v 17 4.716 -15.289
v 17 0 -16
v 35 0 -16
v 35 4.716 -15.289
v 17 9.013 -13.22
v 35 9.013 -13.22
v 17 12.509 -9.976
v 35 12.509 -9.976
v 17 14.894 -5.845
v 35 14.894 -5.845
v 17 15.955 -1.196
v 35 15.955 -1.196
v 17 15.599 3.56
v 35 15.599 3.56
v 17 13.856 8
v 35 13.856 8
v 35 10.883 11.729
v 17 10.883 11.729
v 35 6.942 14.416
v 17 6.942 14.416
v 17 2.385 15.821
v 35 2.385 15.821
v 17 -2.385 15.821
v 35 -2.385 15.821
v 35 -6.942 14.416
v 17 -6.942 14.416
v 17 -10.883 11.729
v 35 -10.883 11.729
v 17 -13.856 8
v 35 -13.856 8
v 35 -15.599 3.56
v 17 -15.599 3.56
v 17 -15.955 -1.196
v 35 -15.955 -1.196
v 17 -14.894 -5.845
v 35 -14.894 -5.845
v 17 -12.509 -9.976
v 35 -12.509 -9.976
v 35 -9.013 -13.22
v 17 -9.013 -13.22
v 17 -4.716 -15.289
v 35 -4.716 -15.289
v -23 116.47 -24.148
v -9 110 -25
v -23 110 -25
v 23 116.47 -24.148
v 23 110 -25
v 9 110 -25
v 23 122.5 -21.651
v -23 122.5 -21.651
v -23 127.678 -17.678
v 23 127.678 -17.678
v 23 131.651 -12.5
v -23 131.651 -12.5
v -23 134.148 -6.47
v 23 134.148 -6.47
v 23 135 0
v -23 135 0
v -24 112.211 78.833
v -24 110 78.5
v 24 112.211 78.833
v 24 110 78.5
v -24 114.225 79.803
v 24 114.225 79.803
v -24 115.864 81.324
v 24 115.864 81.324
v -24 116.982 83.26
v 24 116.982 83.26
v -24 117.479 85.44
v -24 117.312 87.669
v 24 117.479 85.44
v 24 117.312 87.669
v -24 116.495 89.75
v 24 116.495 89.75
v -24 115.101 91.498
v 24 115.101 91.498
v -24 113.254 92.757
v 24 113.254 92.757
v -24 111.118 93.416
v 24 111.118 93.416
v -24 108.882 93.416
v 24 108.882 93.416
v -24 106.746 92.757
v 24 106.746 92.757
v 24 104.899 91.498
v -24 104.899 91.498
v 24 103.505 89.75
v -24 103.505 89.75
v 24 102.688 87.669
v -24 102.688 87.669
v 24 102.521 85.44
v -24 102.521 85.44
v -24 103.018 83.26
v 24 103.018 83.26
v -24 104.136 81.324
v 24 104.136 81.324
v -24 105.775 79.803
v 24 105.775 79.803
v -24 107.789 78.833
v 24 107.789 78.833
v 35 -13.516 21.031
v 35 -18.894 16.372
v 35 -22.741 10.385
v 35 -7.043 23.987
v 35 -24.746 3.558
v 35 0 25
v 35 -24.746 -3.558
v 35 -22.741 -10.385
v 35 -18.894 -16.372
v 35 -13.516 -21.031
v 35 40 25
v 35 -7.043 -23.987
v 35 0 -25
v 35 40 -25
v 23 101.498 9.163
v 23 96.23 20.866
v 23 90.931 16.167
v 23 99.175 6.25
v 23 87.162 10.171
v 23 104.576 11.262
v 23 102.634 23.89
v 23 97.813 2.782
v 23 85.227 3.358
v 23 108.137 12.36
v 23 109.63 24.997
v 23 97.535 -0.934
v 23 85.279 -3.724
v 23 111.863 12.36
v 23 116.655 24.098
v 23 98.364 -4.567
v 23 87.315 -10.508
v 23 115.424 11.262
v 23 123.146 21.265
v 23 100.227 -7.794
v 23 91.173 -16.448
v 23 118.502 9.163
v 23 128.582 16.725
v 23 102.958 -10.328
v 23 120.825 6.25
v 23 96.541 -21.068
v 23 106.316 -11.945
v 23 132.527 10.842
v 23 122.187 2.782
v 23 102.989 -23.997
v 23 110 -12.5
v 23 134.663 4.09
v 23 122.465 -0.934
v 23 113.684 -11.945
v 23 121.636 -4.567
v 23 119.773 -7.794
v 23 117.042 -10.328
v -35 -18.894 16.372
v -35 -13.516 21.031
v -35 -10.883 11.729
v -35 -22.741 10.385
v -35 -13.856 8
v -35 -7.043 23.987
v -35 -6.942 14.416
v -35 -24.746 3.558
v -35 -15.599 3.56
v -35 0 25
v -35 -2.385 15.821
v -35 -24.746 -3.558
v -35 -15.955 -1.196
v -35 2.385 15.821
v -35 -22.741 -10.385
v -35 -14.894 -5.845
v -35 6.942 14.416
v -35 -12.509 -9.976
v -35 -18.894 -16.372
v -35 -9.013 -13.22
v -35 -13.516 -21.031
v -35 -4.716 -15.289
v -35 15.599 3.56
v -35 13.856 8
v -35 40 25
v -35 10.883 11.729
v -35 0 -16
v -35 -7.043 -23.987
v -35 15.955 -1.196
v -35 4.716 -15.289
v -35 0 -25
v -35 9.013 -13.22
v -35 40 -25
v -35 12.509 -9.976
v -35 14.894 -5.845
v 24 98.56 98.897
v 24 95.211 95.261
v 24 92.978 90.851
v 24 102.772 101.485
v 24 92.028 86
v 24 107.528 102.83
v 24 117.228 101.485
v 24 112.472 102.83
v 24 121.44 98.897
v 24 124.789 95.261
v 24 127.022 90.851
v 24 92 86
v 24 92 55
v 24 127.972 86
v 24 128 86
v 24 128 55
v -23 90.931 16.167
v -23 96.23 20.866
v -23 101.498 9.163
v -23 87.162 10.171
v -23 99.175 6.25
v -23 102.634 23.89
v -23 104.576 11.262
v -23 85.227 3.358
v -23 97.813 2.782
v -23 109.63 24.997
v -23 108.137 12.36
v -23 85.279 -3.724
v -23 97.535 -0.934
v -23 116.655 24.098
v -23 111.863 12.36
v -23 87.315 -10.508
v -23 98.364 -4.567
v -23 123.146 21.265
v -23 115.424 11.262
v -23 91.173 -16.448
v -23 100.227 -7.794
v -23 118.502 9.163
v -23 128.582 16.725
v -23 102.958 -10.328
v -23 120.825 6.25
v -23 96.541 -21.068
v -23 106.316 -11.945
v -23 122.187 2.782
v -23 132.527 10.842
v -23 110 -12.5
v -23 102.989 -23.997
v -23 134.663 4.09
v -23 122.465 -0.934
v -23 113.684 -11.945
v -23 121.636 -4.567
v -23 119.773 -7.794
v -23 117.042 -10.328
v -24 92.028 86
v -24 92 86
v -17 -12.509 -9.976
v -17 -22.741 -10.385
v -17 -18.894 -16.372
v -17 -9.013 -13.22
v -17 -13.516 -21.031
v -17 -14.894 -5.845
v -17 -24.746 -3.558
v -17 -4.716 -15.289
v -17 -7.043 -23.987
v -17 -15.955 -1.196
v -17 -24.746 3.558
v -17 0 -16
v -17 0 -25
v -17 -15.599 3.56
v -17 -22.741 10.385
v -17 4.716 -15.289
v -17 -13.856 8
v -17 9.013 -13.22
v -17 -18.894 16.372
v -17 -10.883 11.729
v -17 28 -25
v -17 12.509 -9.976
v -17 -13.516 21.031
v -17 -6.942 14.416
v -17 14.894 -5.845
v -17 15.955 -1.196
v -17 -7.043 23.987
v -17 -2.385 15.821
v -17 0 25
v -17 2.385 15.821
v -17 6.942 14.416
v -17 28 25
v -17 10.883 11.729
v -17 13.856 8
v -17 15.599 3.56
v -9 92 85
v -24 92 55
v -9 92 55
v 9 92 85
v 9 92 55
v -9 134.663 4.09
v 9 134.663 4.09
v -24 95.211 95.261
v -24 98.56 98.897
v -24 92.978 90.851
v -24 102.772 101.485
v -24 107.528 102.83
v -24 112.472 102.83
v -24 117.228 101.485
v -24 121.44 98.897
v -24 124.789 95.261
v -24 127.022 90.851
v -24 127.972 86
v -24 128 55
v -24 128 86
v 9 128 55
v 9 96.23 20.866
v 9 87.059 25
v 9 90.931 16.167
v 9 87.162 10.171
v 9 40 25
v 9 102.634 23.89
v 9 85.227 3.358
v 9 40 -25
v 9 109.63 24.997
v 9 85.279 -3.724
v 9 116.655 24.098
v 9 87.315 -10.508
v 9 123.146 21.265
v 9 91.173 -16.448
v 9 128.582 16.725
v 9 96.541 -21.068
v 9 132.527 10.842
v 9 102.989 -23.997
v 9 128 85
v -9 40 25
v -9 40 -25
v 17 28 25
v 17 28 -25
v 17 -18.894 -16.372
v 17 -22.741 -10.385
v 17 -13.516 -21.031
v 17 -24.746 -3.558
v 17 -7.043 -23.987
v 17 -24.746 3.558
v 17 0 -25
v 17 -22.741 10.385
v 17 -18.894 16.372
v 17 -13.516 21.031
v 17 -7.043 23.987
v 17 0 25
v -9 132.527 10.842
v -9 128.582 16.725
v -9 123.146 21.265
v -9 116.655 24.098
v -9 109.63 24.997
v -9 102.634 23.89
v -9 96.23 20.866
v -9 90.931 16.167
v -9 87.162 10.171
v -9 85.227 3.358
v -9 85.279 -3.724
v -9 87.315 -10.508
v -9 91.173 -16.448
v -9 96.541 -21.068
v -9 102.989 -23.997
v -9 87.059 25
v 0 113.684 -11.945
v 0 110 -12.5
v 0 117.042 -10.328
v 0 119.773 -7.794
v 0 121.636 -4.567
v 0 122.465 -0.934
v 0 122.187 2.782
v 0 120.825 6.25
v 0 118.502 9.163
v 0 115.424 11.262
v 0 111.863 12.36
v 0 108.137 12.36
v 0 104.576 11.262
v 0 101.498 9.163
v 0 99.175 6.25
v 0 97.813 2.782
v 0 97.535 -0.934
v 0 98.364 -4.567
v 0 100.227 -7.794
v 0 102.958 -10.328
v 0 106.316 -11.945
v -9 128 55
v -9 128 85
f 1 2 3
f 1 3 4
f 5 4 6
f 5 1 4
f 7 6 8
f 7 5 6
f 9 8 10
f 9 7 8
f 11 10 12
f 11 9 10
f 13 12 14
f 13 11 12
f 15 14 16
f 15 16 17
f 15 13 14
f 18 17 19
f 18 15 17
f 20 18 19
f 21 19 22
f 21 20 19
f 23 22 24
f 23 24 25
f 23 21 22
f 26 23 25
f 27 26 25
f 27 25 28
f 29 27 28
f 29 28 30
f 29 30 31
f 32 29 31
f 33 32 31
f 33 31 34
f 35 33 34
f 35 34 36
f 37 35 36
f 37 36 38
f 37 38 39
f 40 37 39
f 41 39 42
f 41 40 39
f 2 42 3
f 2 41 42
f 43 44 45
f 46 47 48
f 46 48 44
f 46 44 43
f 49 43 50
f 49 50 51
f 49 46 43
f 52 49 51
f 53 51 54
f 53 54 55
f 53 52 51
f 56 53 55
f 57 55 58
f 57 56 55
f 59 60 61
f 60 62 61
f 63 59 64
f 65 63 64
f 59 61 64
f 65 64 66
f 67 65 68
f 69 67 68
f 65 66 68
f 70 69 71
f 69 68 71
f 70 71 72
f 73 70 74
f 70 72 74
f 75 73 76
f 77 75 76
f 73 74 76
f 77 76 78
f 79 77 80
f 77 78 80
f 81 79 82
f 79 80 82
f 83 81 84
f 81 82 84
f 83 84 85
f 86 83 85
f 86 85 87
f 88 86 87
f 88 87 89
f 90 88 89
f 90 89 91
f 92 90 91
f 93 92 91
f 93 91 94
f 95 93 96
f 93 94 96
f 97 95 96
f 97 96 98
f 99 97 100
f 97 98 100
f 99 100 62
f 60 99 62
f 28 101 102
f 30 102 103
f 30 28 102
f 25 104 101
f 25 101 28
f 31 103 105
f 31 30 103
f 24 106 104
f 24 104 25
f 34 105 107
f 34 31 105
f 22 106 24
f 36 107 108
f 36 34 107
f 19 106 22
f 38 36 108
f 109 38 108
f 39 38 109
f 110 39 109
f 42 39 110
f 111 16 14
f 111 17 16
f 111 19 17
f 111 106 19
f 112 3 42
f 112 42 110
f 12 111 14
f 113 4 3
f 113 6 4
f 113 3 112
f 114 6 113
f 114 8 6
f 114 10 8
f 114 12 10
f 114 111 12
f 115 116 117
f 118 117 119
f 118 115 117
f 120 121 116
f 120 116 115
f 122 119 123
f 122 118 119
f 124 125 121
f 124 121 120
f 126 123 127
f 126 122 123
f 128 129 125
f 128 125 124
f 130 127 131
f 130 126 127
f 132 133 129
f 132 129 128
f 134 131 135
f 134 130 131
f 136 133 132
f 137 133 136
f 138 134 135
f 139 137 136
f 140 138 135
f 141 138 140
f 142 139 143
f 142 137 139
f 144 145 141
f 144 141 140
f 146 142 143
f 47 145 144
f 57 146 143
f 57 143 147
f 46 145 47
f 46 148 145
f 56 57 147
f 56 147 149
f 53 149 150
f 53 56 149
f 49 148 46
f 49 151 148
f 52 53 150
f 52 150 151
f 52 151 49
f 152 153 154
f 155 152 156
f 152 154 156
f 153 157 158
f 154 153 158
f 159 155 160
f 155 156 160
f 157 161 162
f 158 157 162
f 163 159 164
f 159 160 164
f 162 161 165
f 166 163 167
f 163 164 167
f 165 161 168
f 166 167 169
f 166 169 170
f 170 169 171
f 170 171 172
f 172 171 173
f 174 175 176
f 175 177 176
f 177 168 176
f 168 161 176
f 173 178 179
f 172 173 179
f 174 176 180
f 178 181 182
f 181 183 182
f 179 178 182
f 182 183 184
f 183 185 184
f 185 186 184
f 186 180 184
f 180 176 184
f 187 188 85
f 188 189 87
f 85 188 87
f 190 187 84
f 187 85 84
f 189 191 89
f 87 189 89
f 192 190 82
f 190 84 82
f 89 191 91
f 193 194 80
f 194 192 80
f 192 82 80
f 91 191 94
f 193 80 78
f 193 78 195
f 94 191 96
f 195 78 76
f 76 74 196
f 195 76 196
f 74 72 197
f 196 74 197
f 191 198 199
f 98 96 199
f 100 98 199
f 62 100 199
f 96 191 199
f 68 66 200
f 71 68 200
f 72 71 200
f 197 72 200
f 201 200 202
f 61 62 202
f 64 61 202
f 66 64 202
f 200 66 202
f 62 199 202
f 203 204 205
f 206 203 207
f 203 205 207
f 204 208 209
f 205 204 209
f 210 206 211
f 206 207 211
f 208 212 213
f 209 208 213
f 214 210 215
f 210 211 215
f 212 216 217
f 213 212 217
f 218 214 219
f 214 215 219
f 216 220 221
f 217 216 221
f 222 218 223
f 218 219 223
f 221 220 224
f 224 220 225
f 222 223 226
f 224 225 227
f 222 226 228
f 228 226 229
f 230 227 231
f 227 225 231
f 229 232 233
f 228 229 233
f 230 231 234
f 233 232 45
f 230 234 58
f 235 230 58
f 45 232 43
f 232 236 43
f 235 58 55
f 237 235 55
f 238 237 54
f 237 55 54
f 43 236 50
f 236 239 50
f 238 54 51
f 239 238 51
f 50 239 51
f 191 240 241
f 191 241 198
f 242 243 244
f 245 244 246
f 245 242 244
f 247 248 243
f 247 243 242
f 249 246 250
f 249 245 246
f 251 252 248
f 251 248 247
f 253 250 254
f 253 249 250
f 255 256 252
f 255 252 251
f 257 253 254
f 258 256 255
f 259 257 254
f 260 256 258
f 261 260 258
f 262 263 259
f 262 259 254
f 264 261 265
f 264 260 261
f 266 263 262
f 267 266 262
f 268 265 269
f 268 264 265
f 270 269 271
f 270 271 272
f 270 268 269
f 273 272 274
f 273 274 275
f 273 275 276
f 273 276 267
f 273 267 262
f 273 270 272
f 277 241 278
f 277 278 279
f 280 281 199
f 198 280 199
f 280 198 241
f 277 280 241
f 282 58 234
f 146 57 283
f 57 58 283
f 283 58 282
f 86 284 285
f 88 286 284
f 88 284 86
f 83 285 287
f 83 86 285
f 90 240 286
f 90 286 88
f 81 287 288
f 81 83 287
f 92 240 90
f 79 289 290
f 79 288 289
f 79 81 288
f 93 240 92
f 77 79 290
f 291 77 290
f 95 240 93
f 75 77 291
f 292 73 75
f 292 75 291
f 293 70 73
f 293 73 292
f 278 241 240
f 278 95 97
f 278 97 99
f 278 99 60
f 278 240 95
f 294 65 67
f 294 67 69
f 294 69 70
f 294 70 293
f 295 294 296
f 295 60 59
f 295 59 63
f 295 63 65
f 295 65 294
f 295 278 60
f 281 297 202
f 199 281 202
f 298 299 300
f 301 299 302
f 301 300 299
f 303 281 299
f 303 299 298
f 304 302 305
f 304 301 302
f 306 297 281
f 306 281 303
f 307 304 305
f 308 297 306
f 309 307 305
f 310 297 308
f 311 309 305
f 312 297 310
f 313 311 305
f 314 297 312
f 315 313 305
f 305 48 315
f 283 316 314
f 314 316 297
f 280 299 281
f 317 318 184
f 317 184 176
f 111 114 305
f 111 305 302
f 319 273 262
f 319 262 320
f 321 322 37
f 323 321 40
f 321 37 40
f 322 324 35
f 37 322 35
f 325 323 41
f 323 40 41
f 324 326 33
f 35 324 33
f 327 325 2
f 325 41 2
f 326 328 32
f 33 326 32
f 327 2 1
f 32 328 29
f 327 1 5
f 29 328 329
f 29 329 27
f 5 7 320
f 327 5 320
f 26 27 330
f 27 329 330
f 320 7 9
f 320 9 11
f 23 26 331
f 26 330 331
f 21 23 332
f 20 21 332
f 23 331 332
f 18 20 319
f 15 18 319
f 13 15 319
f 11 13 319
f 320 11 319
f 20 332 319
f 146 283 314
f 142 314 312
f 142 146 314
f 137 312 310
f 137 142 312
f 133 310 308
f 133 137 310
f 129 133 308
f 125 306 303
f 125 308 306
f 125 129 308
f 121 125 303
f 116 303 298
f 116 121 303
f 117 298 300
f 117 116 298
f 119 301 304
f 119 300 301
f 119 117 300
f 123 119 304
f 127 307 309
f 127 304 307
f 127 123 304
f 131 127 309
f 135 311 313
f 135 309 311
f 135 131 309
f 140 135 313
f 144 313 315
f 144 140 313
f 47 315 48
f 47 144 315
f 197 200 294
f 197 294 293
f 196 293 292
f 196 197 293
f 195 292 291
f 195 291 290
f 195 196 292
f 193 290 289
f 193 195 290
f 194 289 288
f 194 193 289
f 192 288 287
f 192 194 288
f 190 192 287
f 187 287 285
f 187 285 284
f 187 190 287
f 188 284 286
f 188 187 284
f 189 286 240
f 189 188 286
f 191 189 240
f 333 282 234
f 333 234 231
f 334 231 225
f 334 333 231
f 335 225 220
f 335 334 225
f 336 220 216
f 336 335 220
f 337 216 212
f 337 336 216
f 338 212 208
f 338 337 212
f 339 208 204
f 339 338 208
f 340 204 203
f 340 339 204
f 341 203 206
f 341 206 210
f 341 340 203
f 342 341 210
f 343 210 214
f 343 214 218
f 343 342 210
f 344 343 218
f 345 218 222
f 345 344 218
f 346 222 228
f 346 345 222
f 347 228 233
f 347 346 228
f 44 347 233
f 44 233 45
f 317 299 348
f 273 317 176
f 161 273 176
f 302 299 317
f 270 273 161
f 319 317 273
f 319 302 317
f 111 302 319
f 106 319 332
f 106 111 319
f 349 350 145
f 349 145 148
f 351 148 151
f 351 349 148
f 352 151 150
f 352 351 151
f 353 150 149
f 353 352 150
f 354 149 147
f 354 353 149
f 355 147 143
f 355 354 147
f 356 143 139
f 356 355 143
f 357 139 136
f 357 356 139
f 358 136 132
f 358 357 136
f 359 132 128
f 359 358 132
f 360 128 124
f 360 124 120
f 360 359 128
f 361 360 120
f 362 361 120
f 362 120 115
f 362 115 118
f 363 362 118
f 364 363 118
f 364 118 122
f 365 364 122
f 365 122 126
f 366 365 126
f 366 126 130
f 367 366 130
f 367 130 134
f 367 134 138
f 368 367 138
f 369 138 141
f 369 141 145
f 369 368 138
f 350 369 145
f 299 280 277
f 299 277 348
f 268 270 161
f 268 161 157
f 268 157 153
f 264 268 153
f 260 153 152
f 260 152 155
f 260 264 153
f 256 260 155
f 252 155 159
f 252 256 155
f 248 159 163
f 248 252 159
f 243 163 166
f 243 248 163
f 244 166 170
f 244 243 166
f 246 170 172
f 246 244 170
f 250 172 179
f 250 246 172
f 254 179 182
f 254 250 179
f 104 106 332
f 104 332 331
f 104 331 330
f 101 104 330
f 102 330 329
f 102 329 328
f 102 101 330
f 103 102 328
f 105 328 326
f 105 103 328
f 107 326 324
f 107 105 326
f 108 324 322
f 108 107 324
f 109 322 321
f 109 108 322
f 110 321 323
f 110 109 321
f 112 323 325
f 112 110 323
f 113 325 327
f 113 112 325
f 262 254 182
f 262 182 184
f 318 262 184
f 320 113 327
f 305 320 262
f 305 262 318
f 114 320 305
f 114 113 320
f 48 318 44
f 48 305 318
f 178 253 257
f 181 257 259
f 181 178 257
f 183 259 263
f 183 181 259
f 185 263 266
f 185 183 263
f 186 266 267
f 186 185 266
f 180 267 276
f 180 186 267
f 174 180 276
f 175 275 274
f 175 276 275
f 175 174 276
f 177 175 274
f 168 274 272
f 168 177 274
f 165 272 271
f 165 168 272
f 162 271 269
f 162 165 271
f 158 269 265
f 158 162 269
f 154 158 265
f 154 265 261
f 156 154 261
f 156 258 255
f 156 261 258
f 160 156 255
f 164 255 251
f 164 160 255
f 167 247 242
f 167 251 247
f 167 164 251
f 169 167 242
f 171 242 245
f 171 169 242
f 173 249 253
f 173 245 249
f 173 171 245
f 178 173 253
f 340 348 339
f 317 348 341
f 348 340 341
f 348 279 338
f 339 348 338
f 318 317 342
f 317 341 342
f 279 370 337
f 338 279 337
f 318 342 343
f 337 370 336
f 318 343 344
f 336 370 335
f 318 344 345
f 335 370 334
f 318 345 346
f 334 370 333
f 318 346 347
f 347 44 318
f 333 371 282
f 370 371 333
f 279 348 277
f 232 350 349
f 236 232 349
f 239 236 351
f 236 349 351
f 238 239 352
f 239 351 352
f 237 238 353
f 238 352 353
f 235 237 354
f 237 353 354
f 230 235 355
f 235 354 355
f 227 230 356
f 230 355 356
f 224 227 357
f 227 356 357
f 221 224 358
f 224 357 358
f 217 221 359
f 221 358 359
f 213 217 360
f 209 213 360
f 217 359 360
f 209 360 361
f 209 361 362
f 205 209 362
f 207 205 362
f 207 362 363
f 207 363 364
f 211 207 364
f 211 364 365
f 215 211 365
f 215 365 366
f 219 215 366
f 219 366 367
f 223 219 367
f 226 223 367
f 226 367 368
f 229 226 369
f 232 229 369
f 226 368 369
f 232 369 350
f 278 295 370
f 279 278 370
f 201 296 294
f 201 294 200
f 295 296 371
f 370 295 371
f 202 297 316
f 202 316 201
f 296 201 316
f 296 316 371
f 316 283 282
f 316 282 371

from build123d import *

# Parameters (mm, degrees)
ESBO_O1_R                = 7.5
RESSALTO_EXTRUS_O1_DEPTH = 24
RESSALTO_EXTRUS_O2_DEPTH = 9
ESBO_O1_4_R              = 12.5
RESSALTO_EXTRUS_O3_DEPTH = 23
ESBO_O1_5_R              = 16
RESSALTO_EXTRUS_O4_DEPTH = 35
ESBO_O2_W                = 34
ESBO_O2_H                = 66.30992931
CORTE_EXTRUS_O1_DEPTH    = 70
ESBO_O3_W                = 48
ESBO_O3_H                = 36
RESSALTO_EXTRUS_O7_DEPTH = 31
ESBO_O4_R                = 7.5
CORTE_EXTRUS_O2_DEPTH    = 48.5


with BuildPart() as part:
    # Esboço1 → Ressalto-extrusão1 (new, symmetric)
    with BuildSketch(Plane(origin=(0, 0, 0), x_dir=(0, 0, -1), z_dir=(1, 0, 0))):
        with BuildLine():
            ThreePointArc((-67, 110), (-72.272077939, 122.727922061), (-85, 128))
            ThreePointArc((-85, 128), (-103, 110), (-85, 92))
            ThreePointArc((-85, 92), (-72.272077939, 97.272077939), (-67, 110))
        make_face()
        with Locations((-85, 110)):
            Circle(ESBO_O1_R, mode=Mode.SUBTRACT)
    extrude(amount=RESSALTO_EXTRUS_O1_DEPTH, both=True)

    # Esboço1<3> → Ressalto-extrusão2 (add, symmetric)
    with BuildSketch(Plane(origin=(0, 0, 0), x_dir=(0, 0, -1), z_dir=(1, 0, 0))):
        with BuildLine():
            Line((25, 40), (25, 110))
            ThreePointArc((25, 110), (-16.167131291, 90.931075913), (-4.089909266, 134.663183943))
            Line((-4.089909266, 134.663183943), (-85, 128))
            ThreePointArc((-85, 128), (-72.272077939, 122.727922061), (-67, 110))
            ThreePointArc((-67, 110), (-72.272077939, 97.272077939), (-85, 92))
            Line((-85, 92), (-25, 87.058823529))
            Line((-25, 87.058823529), (-25, 40))
            Line((-25, 40), (25, 40))
        make_face()
    extrude(amount=RESSALTO_EXTRUS_O2_DEPTH, both=True)

    # Esboço1<4> → Ressalto-extrusão3 (add, symmetric)
    with BuildSketch(Plane(origin=(0, 0, 0), x_dir=(0, 0, -1), z_dir=(1, 0, 0))):
        with BuildLine():
            ThreePointArc((-4.089909266, 134.663183943), (-16.167131291, 90.931075913), (25, 110))
            ThreePointArc((25, 110), (17.67766953, 127.67766953), (0, 135))
            Line((0, 135), (-4.089909266, 134.663183943))
        make_face()
        with Locations((0, 110)):
            Circle(ESBO_O1_4_R, mode=Mode.SUBTRACT)
    extrude(amount=RESSALTO_EXTRUS_O3_DEPTH, both=True)

    # Esboço1<5> → Ressalto-extrusão4 (add, symmetric)
    with BuildSketch(Plane(origin=(0, 0, 0), x_dir=(0, 0, -1), z_dir=(1, 0, 0))):
        with BuildLine():
            Line((25, 0), (25, 40))
            Line((25, 40), (-25, 40))
            Line((-25, 40), (-25, 0))
            ThreePointArc((-25, 0), (0, -25), (25, 0))
        make_face()
        Circle(ESBO_O1_5_R, mode=Mode.SUBTRACT)
    extrude(amount=RESSALTO_EXTRUS_O4_DEPTH, both=True)

    # Esboço2 → Corte-extrusão1 (cut, symmetric)
    with BuildSketch(Plane.XY):
        with Locations((0, -5.154964655)):
            Rectangle(ESBO_O2_W, ESBO_O2_H)
    extrude(amount=CORTE_EXTRUS_O1_DEPTH, both=True, mode=Mode.SUBTRACT)

    # Esboço3 → Ressalto-extrusão7 (add)
    with BuildSketch(Plane.XY.offset(55)):
        with Locations((0, 110)):
            Rectangle(ESBO_O3_W, ESBO_O3_H)
    extrude(amount=RESSALTO_EXTRUS_O7_DEPTH)

    # Esboço4 → Corte-extrusão2 (cut, symmetric)
    with BuildSketch(Plane(origin=(0, 0, 0), x_dir=(0, 0, -1), z_dir=(1, 0, 0))):
        with Locations((-86, 110)):
            Circle(ESBO_O4_R)
    extrude(amount=CORTE_EXTRUS_O2_DEPTH, both=True, mode=Mode.SUBTRACT)


solid = part.part
